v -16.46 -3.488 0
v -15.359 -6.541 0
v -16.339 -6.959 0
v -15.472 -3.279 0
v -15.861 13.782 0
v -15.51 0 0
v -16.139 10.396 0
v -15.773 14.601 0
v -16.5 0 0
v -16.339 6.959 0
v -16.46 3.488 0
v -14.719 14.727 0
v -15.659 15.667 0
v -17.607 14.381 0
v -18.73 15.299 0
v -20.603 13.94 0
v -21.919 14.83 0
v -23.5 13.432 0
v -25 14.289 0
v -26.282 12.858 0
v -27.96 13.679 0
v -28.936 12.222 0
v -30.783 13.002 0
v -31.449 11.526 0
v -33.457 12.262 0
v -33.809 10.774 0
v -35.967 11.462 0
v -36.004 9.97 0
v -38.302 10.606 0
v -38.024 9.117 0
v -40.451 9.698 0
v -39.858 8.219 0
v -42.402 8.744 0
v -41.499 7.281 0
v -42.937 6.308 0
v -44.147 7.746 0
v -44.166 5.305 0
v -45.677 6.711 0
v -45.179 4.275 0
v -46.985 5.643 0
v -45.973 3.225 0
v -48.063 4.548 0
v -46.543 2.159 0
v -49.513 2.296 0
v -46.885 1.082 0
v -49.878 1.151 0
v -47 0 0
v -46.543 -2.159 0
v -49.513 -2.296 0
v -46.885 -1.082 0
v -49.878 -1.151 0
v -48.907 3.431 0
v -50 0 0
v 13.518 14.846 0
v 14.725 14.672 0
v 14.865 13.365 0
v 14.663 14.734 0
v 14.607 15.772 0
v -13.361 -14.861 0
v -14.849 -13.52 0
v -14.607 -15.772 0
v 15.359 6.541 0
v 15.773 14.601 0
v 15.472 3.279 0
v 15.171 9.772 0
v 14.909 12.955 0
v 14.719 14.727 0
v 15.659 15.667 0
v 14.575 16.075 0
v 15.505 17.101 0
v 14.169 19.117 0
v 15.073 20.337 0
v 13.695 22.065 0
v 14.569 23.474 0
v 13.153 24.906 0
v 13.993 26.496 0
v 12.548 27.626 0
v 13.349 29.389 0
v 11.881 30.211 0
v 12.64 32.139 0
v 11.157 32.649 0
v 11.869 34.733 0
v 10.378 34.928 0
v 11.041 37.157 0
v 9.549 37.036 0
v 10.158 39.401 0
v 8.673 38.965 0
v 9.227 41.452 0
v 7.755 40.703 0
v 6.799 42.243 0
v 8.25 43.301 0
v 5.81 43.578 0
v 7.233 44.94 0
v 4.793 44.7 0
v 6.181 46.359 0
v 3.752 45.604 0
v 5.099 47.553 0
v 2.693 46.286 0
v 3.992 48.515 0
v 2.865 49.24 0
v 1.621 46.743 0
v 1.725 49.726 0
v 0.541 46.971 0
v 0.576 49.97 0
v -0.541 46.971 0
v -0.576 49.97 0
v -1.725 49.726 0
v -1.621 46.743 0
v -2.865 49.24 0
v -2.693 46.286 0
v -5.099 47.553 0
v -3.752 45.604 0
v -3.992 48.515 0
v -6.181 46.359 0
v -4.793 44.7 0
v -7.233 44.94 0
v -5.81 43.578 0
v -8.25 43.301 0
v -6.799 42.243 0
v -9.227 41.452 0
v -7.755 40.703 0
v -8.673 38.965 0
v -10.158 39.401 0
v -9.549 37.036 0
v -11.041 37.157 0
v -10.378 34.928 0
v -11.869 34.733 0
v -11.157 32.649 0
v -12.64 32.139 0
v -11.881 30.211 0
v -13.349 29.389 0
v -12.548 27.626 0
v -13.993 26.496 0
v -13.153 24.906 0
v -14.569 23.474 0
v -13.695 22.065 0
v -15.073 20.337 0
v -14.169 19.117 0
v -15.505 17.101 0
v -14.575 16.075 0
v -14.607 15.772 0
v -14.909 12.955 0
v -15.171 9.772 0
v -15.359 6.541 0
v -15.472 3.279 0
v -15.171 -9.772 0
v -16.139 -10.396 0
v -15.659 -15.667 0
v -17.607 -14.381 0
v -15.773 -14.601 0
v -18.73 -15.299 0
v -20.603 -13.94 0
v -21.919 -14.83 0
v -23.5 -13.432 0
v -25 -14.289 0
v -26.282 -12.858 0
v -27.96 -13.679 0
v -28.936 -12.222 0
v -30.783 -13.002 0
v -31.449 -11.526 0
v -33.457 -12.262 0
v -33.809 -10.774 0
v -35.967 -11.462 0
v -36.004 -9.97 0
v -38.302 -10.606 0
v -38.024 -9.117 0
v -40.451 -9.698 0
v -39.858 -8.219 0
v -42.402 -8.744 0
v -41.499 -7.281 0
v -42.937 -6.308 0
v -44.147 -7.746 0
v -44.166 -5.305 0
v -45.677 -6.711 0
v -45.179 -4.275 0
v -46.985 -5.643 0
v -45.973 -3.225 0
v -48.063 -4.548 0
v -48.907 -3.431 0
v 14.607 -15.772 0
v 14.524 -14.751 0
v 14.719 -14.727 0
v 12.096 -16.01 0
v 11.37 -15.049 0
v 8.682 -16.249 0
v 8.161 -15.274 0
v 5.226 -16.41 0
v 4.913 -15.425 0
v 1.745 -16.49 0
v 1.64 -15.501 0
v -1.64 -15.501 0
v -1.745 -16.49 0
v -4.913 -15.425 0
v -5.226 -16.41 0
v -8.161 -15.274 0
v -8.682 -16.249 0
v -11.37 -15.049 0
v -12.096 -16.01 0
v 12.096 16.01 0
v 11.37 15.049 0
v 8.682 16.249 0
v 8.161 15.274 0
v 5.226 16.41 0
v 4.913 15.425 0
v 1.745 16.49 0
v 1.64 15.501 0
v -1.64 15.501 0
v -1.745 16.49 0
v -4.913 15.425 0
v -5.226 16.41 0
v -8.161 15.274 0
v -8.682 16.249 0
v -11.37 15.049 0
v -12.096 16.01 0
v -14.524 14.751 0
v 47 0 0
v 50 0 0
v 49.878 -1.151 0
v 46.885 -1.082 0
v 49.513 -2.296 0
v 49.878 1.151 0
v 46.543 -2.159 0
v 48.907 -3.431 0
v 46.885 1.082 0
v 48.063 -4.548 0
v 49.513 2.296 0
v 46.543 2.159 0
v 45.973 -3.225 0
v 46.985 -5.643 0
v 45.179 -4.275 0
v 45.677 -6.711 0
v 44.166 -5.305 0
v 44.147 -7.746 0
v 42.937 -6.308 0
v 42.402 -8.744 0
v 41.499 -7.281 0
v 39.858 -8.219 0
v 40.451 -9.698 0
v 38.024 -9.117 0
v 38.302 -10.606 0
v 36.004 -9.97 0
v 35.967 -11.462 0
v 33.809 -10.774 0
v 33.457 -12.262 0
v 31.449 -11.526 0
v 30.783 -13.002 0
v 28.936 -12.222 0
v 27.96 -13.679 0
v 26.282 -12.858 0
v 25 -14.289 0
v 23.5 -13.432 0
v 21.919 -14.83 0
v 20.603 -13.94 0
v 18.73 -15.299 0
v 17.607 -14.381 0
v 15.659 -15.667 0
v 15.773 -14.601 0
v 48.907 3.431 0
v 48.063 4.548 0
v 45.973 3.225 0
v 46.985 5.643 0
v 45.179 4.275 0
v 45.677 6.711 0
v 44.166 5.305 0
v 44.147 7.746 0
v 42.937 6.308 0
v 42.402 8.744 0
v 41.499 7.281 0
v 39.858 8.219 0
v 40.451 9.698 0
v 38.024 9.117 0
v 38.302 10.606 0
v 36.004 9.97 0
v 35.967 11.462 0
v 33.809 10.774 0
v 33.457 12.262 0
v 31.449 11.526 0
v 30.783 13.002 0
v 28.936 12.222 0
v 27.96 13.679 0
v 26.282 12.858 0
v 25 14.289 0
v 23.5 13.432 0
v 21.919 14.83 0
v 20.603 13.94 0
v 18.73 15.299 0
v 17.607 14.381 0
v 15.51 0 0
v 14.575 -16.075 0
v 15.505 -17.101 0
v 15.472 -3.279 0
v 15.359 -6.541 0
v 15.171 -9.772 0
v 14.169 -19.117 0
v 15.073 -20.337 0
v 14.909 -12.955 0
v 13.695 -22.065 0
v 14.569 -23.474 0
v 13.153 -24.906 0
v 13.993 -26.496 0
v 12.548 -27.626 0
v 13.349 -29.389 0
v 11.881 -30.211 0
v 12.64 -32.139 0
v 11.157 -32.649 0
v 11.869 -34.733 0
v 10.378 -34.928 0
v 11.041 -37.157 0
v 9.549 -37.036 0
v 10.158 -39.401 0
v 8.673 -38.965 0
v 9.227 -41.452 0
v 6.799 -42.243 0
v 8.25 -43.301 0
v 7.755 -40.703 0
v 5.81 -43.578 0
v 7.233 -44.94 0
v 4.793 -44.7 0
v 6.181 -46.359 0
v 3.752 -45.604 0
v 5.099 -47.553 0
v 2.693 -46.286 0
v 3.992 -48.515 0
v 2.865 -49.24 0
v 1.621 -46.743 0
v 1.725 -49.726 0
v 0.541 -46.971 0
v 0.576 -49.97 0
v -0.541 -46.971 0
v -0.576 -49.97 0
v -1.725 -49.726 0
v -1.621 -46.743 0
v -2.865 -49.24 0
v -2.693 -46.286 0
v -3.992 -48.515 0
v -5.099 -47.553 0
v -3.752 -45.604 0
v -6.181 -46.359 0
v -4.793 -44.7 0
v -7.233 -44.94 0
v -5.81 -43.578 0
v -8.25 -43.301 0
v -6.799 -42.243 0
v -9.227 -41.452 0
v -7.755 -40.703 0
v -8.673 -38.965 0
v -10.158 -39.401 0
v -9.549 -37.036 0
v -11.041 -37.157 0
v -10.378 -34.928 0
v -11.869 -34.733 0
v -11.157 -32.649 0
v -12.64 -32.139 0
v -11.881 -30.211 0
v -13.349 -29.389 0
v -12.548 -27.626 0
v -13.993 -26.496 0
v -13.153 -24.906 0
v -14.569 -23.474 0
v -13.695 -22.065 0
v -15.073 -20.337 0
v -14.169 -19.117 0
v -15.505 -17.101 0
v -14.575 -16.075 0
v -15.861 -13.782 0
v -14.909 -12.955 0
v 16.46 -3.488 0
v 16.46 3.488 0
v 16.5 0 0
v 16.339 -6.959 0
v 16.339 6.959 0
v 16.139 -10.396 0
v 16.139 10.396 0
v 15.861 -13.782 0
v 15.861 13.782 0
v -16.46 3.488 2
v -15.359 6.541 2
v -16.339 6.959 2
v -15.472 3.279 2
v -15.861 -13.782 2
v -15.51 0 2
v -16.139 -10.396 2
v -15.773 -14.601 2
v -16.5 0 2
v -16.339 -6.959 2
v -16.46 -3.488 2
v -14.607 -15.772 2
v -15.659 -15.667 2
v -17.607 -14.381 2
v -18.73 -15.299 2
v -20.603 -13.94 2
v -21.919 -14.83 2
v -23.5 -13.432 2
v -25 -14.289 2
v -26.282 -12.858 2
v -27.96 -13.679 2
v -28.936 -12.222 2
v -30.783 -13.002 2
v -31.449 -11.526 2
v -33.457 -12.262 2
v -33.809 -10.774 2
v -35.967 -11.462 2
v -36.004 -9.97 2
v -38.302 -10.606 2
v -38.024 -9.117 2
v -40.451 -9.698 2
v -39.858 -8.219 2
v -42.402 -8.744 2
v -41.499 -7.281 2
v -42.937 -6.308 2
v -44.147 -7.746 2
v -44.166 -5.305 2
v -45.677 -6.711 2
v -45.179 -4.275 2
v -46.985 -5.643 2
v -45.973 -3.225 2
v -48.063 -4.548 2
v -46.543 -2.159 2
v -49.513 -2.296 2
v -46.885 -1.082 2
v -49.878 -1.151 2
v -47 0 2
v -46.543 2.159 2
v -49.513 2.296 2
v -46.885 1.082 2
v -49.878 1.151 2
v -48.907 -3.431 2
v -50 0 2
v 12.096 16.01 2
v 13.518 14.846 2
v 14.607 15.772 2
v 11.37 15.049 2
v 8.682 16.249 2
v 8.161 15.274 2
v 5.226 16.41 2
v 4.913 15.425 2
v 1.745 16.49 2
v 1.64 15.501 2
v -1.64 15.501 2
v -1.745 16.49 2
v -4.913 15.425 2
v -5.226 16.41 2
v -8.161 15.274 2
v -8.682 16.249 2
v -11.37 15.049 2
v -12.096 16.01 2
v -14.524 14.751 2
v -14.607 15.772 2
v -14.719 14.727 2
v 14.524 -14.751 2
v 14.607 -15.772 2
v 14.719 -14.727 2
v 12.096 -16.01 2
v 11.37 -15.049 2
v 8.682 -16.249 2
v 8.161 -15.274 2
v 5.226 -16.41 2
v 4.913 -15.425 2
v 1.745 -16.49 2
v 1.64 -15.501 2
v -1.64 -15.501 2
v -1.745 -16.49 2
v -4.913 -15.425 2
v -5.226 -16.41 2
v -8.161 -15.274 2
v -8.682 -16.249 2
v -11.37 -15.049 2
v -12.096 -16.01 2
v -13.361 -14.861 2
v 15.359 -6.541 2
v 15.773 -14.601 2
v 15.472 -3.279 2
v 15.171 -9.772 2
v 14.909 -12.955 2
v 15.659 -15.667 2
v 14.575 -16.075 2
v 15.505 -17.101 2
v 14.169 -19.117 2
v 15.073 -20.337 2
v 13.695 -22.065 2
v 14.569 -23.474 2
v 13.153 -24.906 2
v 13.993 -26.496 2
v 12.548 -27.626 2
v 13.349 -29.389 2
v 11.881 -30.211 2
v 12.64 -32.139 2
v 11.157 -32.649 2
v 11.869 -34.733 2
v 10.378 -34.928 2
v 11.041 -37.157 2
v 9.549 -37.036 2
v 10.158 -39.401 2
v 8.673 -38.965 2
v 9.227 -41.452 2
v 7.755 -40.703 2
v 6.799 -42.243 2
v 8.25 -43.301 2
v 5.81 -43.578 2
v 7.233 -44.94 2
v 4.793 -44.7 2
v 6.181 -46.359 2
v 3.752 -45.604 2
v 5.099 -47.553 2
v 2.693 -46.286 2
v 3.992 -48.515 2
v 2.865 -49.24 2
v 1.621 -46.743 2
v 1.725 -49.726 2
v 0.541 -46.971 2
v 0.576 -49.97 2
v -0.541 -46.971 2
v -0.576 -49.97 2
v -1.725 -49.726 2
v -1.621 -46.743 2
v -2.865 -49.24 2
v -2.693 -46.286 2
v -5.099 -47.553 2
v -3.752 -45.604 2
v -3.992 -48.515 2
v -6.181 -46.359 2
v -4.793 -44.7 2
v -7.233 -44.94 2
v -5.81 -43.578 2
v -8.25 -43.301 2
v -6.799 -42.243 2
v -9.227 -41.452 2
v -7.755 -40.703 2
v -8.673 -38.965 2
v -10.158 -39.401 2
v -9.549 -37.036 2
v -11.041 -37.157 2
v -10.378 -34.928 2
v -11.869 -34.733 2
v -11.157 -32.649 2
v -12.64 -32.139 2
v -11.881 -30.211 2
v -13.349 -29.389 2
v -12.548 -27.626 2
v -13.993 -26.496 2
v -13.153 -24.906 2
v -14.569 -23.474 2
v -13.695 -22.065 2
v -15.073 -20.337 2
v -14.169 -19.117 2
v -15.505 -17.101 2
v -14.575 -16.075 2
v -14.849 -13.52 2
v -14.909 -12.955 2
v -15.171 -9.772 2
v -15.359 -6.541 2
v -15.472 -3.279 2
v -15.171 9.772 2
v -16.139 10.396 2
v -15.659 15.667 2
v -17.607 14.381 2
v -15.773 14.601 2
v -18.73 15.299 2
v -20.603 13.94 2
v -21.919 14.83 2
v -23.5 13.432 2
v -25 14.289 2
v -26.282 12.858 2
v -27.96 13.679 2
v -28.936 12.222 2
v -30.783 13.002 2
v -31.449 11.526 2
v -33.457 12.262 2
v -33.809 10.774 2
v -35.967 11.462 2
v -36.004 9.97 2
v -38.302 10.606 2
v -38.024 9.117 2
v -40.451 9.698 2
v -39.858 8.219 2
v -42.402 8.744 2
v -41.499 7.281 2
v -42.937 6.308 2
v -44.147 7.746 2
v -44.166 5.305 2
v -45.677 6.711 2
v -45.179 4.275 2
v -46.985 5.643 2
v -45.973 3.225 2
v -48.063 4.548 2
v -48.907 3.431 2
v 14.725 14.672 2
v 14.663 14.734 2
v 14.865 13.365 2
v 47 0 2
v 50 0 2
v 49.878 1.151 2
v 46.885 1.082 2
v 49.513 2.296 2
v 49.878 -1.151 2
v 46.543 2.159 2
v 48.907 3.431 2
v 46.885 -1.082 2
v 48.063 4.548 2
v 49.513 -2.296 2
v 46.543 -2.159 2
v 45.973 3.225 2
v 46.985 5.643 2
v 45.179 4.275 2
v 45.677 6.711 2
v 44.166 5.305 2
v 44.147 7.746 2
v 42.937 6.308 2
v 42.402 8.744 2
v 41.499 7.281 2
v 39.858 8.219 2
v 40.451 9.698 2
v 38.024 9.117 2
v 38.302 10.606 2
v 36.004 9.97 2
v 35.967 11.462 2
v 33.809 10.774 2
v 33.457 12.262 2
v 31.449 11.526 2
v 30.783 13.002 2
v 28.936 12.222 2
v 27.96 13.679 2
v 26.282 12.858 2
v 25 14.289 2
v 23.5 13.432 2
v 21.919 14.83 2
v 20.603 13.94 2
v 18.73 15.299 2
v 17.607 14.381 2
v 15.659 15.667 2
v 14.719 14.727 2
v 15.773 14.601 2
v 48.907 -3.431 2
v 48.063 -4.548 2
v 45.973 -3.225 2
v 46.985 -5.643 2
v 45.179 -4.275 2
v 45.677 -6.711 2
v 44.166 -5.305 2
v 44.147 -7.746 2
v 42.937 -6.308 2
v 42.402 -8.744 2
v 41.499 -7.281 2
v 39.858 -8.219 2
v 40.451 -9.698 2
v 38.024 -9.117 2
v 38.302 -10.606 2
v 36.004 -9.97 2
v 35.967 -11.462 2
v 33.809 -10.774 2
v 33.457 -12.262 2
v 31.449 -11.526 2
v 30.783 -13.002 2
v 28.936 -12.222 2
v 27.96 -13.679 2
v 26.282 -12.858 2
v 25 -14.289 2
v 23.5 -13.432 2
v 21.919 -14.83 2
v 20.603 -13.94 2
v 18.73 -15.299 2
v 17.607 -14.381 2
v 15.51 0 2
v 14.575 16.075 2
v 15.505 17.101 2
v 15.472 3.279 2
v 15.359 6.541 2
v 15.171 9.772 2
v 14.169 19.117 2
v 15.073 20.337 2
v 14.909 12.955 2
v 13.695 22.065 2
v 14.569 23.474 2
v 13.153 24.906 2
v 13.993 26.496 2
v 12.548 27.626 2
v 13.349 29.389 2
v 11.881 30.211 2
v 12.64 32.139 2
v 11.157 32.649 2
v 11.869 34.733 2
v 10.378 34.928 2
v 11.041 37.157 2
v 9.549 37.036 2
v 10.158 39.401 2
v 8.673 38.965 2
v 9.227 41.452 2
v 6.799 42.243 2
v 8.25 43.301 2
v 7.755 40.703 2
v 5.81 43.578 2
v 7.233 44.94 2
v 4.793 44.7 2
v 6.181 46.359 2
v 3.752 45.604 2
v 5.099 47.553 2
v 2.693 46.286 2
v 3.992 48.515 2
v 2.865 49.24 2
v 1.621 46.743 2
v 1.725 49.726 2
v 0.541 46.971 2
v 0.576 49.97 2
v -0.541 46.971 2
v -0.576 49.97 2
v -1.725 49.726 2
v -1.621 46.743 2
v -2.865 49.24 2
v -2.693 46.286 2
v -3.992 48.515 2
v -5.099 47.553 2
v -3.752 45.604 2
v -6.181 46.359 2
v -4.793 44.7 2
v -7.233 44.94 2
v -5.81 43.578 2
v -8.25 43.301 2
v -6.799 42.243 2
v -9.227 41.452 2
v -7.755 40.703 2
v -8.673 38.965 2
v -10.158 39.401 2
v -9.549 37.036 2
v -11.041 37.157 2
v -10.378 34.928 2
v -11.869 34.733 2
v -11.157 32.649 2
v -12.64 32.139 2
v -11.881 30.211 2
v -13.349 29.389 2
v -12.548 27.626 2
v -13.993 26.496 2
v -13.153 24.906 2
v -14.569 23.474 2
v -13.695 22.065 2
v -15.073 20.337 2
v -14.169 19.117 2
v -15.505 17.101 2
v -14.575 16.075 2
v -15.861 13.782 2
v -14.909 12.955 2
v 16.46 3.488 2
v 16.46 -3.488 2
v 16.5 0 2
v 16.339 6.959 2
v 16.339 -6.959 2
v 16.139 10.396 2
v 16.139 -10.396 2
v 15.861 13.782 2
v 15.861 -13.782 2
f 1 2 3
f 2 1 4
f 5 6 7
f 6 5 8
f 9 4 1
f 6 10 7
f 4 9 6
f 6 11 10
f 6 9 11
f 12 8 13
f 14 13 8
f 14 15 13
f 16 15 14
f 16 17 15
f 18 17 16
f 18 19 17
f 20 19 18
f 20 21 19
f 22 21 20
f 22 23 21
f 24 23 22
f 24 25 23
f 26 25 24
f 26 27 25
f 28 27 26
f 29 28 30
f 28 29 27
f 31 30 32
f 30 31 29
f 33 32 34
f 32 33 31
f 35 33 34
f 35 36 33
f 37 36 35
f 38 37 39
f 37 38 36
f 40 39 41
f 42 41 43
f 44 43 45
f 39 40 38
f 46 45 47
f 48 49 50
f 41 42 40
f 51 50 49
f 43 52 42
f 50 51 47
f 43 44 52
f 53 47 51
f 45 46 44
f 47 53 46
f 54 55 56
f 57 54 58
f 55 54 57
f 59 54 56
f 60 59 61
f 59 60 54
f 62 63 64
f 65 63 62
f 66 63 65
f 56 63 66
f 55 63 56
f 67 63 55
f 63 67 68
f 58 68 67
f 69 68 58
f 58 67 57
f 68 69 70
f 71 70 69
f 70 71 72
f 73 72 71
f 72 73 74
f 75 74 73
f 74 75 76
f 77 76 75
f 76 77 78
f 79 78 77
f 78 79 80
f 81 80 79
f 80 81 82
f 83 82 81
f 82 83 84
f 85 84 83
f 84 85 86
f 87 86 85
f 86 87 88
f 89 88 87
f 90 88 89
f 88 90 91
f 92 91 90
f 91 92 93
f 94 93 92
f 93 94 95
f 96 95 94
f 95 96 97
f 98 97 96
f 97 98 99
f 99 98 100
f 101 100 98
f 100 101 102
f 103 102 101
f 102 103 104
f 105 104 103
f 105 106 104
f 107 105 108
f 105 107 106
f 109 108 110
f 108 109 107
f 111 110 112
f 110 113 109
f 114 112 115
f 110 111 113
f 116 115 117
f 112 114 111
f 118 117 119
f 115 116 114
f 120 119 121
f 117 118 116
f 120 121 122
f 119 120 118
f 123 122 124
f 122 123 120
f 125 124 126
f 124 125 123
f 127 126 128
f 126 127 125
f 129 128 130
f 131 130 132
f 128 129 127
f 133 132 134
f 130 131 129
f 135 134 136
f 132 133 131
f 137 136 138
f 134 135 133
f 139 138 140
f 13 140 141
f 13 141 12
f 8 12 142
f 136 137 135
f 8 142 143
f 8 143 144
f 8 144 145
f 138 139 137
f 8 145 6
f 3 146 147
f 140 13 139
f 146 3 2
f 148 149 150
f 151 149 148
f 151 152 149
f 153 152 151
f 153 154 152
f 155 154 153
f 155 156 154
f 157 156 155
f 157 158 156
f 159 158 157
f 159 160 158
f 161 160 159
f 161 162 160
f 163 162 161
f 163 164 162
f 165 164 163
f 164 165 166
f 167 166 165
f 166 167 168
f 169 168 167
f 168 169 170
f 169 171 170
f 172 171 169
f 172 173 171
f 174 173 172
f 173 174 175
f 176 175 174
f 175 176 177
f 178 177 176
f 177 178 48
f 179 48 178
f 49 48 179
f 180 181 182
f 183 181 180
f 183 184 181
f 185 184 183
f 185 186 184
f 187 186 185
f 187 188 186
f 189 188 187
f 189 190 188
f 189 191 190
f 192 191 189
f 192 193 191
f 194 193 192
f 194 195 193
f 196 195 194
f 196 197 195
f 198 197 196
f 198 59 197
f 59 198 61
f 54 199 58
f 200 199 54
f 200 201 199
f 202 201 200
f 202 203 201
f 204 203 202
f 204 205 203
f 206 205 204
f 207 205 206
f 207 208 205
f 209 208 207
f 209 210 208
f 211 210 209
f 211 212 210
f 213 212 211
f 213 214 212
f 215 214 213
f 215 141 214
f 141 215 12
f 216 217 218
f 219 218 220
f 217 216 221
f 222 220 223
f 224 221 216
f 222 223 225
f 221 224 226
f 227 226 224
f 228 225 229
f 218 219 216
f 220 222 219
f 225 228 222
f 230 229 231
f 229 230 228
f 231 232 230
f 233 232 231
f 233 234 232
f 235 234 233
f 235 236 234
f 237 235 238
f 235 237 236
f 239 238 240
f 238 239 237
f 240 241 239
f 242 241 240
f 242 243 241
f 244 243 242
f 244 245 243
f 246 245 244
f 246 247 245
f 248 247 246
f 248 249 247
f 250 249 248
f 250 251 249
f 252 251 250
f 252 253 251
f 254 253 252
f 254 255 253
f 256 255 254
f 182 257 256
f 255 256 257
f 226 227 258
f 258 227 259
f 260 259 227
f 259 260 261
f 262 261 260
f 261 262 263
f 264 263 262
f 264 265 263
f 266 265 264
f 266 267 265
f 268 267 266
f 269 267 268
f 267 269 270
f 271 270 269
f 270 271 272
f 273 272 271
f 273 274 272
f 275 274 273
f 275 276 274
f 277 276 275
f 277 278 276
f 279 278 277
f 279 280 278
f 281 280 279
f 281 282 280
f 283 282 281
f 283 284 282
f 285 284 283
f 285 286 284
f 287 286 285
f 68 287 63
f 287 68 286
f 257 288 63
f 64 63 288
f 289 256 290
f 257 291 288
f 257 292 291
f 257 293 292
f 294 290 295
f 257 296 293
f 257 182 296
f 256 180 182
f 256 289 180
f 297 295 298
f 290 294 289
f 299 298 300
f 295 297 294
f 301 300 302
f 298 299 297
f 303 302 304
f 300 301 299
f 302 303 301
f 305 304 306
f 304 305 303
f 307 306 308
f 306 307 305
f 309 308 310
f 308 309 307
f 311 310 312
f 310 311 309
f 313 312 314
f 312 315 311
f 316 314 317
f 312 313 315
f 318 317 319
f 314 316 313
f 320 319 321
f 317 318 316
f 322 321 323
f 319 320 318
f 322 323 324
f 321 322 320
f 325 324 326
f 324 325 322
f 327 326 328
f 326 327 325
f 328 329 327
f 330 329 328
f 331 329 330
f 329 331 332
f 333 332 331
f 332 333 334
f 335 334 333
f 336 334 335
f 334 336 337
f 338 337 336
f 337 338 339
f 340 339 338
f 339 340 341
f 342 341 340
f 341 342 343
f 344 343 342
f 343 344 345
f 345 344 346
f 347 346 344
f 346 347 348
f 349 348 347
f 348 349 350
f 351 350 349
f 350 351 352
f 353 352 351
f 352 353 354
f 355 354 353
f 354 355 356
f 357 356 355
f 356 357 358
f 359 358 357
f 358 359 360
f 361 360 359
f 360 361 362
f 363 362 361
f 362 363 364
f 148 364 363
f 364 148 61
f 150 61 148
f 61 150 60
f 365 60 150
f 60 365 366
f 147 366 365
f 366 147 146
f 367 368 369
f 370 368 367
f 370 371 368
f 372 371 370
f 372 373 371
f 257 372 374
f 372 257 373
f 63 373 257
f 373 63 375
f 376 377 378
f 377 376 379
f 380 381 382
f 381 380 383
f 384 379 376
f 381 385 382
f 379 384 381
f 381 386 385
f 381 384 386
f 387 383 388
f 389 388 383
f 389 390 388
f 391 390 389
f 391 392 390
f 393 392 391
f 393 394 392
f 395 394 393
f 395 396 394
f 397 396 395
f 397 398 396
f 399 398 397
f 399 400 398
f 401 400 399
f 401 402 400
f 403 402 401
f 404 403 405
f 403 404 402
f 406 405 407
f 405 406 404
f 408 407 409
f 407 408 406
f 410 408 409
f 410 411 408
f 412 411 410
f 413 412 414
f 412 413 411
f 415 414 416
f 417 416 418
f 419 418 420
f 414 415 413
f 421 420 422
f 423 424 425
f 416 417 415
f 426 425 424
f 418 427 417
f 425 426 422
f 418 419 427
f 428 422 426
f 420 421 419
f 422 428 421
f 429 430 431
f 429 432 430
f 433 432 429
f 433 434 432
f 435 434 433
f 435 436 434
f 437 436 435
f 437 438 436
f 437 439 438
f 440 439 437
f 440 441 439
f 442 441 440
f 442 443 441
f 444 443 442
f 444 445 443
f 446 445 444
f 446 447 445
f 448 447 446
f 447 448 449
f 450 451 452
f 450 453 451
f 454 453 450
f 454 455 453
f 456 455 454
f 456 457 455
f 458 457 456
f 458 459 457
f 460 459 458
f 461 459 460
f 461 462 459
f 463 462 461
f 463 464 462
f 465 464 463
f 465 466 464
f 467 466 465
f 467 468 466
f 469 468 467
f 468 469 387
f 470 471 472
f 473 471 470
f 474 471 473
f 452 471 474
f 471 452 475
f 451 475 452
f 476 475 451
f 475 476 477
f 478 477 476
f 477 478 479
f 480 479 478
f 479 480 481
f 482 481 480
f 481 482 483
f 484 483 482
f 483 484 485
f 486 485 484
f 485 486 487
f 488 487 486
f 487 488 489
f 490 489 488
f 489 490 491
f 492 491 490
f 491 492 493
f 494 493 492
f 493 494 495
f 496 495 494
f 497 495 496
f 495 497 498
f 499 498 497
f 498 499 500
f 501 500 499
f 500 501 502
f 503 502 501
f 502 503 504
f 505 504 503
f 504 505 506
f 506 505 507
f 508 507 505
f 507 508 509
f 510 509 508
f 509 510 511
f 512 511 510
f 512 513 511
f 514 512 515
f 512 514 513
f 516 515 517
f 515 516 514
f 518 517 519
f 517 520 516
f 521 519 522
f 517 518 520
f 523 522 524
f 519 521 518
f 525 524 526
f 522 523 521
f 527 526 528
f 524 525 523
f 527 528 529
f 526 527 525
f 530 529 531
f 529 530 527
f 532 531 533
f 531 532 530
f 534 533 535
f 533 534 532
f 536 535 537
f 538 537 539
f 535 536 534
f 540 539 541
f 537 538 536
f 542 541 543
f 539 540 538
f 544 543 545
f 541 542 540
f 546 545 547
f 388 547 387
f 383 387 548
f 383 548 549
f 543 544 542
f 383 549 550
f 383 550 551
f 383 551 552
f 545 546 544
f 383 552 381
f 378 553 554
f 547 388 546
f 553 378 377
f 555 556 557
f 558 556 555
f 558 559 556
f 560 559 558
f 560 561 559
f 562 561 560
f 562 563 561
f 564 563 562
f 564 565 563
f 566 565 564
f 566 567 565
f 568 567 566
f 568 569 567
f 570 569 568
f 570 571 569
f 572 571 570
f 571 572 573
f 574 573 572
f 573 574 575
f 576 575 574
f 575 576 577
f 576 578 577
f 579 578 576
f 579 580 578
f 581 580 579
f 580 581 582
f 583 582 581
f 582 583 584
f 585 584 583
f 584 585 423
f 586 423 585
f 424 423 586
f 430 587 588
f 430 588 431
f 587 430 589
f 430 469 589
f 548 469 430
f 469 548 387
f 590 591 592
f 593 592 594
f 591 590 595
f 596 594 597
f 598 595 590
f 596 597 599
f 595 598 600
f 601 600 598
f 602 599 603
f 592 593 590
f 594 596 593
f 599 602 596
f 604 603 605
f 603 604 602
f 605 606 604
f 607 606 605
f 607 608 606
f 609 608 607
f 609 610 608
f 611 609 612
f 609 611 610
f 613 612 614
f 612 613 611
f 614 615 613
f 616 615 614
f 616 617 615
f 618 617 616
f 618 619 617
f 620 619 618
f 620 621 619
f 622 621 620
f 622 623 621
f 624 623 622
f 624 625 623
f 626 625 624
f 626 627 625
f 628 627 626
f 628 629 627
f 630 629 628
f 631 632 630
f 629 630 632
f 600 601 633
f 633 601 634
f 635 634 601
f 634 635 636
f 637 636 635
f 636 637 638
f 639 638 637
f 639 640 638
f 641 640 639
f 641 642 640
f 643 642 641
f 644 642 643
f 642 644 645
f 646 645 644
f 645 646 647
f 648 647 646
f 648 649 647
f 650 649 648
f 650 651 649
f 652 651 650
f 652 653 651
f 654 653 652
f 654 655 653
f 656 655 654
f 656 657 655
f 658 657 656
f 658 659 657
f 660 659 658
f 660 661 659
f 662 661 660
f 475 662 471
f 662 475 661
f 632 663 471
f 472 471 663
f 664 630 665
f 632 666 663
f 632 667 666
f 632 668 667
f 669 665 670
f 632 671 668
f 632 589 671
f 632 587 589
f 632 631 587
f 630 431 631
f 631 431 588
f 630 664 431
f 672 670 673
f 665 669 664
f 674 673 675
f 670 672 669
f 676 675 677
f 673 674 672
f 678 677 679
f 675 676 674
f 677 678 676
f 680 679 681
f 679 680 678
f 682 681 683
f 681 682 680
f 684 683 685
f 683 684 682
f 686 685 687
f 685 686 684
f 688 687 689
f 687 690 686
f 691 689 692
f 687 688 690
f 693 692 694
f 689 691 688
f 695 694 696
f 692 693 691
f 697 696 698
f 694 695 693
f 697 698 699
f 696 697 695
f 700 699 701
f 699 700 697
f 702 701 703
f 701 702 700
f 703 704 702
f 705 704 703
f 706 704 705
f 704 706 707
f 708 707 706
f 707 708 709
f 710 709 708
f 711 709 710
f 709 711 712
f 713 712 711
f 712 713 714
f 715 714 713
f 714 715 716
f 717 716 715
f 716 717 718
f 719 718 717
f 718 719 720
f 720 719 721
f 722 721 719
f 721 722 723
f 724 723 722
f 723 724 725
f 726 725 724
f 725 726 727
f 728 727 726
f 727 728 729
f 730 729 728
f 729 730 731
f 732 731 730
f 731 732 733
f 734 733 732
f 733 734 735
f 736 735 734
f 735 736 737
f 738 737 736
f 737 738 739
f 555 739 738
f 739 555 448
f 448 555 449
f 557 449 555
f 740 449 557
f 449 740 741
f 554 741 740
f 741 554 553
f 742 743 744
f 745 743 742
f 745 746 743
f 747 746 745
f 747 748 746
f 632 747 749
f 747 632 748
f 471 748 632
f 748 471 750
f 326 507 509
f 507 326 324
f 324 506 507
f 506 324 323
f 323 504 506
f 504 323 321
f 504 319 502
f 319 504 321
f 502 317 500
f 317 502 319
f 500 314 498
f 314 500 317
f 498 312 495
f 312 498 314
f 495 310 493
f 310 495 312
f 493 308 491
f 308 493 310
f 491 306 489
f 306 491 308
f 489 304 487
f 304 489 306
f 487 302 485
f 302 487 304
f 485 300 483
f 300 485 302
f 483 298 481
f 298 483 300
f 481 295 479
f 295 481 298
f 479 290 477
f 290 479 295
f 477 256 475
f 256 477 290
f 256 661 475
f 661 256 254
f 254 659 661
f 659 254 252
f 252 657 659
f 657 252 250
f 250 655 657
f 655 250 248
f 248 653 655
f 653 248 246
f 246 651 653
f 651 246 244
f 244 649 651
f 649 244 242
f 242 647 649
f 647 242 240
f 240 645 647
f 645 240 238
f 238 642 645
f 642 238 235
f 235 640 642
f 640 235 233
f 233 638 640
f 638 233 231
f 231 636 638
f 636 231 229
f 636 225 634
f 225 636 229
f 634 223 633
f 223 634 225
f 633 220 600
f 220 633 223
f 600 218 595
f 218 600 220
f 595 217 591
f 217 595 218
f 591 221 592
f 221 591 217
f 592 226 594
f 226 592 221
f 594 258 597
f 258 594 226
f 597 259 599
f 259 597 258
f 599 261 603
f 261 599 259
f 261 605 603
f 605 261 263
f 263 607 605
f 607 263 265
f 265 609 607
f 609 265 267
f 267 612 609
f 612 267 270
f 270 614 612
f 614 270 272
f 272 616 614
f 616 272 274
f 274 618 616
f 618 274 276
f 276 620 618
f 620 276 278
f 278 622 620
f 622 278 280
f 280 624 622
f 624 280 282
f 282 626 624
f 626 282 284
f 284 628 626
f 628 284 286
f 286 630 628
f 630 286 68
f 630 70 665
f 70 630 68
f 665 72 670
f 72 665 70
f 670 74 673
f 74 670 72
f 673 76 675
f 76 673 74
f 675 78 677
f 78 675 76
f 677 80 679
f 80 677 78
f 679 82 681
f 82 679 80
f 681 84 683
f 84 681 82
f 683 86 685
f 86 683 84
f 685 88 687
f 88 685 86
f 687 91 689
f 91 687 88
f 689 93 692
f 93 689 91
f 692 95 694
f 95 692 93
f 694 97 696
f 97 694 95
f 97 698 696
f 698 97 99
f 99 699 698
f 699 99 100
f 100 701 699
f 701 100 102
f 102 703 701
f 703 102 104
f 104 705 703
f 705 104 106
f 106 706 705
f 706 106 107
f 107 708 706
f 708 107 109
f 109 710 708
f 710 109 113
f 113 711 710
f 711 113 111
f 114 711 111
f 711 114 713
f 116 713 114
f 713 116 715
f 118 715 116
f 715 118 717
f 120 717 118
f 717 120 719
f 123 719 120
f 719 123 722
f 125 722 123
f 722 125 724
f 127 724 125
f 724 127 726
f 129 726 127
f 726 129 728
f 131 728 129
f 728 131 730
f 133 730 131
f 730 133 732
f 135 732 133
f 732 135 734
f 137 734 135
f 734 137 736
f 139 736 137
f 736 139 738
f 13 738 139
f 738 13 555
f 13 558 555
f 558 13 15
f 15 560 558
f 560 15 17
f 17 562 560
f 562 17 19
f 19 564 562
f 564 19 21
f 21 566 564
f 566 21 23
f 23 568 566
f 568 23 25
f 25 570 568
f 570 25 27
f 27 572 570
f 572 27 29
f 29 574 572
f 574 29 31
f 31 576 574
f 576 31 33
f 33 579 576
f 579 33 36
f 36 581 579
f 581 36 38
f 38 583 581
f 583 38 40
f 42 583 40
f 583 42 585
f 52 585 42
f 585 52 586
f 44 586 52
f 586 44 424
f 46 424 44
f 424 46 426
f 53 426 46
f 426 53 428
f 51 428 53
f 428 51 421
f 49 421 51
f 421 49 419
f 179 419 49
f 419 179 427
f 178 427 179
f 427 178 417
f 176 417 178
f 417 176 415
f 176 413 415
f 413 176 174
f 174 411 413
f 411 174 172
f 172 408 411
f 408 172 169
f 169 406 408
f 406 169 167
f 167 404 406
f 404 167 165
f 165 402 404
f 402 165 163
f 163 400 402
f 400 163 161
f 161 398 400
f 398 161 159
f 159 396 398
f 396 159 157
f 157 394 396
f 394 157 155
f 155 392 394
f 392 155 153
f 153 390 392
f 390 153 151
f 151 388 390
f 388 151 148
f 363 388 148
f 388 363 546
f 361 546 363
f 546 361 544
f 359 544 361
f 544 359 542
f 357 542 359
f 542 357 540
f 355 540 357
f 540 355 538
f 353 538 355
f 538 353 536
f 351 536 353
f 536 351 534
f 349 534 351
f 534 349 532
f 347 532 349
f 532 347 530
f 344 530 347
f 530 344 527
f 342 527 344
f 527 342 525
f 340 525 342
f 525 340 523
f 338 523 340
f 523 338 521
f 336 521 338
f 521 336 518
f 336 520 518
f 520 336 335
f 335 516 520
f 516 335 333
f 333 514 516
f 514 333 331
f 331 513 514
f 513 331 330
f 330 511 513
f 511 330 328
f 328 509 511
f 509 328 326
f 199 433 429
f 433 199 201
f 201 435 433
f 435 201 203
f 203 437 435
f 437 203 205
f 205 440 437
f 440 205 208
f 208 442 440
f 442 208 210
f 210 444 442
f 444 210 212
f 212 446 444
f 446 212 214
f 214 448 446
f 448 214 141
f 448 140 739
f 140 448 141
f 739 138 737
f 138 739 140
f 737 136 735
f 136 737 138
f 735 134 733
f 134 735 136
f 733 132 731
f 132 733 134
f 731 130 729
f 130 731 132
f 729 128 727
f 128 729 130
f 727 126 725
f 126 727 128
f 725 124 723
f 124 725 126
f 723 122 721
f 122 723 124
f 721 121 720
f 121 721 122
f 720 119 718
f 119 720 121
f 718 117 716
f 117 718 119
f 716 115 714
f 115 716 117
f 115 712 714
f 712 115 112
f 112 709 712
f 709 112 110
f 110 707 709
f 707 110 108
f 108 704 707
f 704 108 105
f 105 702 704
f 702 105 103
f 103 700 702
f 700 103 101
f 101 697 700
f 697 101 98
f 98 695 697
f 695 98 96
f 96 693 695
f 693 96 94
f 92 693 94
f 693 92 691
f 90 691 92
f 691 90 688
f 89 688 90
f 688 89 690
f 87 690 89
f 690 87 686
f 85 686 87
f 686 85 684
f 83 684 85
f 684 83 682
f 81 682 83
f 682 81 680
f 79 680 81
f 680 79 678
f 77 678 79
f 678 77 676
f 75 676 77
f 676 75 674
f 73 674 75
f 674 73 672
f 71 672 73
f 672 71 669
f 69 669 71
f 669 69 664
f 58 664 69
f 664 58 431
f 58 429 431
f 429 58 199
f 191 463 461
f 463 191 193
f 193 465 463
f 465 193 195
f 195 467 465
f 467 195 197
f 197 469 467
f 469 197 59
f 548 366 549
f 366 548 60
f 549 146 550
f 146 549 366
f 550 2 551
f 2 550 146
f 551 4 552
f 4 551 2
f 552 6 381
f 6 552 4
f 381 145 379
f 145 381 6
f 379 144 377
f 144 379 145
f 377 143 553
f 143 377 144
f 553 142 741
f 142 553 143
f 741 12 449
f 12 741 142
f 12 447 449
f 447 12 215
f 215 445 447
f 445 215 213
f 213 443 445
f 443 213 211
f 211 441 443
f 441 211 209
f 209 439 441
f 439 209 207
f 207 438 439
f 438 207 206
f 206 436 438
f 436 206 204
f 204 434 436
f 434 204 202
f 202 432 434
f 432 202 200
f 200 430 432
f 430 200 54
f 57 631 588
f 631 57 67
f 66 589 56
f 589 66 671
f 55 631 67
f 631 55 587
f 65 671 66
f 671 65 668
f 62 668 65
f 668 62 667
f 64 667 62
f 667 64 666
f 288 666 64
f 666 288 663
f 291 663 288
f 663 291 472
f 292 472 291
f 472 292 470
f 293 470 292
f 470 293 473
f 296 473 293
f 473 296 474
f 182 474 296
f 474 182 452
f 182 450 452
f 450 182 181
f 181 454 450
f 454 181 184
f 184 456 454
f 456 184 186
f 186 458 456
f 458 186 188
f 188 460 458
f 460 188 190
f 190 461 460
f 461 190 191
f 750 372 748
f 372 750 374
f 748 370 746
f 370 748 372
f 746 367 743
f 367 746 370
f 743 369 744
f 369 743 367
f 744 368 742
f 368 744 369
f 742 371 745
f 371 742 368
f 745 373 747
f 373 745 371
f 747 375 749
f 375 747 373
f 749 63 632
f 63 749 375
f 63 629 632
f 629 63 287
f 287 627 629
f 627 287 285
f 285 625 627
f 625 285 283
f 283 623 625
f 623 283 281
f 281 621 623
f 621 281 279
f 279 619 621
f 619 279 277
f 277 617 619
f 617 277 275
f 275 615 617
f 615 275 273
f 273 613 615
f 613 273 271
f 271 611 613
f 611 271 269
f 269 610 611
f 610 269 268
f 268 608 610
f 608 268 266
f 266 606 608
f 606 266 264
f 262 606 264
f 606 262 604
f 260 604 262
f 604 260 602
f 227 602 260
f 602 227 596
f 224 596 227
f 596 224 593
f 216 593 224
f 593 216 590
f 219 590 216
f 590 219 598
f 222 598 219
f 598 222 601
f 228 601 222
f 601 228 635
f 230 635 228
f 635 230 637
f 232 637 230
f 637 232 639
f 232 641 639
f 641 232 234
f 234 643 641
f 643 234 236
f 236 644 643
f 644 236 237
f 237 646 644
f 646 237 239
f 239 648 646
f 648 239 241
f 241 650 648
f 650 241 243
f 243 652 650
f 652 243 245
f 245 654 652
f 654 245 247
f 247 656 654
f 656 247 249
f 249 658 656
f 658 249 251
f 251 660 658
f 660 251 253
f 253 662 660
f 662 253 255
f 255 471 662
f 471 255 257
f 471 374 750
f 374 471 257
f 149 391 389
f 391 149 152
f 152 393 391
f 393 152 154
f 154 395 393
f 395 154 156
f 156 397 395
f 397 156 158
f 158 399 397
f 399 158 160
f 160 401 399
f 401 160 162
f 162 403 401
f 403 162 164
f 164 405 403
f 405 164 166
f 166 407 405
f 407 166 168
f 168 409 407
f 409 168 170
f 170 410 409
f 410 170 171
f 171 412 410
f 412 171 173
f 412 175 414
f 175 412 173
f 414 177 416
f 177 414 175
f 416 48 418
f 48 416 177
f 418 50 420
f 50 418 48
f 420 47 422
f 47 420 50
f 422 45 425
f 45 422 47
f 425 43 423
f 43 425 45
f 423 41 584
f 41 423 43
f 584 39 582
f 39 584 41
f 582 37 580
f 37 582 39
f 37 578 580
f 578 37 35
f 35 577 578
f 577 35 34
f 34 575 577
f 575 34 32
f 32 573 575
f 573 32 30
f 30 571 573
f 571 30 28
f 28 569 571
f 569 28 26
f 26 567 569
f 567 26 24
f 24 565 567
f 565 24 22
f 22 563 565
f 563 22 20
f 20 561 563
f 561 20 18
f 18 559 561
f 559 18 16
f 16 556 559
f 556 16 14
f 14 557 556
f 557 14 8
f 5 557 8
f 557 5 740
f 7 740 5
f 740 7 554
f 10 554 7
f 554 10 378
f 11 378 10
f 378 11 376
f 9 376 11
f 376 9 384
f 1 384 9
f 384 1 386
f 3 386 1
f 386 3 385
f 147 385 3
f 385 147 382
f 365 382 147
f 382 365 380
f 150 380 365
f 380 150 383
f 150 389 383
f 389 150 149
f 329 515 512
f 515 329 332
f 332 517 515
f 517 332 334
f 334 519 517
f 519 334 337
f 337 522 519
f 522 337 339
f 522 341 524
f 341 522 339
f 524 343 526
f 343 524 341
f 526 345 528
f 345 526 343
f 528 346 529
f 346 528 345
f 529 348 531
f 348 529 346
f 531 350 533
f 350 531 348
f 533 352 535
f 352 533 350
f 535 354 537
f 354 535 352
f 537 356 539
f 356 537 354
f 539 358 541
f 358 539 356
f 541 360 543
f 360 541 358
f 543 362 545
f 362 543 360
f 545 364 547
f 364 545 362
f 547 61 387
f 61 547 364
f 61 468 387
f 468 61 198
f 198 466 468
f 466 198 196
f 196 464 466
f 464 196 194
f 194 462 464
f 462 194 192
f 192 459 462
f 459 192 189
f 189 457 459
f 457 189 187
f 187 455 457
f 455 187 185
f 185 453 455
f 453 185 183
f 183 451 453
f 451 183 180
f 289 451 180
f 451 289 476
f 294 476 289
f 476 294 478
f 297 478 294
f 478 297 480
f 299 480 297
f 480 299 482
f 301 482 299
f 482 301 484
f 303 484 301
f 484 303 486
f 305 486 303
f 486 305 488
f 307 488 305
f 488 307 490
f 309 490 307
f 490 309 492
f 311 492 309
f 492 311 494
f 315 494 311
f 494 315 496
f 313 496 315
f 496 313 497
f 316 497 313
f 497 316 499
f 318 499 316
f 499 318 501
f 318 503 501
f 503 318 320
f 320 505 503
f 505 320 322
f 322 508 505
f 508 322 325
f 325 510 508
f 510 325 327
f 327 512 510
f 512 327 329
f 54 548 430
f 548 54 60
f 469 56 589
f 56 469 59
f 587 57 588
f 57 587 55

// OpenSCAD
$fn = 90;

linear_extrude(2) logo();

translate([-14.25, -15.75, 0]) rotate([0, 0, 45]) cube([42, 2, 2]);

module logo() {
    scale([1, 0.33, 1]) ring();
    scale([0.33, 1, 1]) ring();
}

module ring() {
    difference() {
        circle(d = 100);
        circle(d = 94);
    }
}
